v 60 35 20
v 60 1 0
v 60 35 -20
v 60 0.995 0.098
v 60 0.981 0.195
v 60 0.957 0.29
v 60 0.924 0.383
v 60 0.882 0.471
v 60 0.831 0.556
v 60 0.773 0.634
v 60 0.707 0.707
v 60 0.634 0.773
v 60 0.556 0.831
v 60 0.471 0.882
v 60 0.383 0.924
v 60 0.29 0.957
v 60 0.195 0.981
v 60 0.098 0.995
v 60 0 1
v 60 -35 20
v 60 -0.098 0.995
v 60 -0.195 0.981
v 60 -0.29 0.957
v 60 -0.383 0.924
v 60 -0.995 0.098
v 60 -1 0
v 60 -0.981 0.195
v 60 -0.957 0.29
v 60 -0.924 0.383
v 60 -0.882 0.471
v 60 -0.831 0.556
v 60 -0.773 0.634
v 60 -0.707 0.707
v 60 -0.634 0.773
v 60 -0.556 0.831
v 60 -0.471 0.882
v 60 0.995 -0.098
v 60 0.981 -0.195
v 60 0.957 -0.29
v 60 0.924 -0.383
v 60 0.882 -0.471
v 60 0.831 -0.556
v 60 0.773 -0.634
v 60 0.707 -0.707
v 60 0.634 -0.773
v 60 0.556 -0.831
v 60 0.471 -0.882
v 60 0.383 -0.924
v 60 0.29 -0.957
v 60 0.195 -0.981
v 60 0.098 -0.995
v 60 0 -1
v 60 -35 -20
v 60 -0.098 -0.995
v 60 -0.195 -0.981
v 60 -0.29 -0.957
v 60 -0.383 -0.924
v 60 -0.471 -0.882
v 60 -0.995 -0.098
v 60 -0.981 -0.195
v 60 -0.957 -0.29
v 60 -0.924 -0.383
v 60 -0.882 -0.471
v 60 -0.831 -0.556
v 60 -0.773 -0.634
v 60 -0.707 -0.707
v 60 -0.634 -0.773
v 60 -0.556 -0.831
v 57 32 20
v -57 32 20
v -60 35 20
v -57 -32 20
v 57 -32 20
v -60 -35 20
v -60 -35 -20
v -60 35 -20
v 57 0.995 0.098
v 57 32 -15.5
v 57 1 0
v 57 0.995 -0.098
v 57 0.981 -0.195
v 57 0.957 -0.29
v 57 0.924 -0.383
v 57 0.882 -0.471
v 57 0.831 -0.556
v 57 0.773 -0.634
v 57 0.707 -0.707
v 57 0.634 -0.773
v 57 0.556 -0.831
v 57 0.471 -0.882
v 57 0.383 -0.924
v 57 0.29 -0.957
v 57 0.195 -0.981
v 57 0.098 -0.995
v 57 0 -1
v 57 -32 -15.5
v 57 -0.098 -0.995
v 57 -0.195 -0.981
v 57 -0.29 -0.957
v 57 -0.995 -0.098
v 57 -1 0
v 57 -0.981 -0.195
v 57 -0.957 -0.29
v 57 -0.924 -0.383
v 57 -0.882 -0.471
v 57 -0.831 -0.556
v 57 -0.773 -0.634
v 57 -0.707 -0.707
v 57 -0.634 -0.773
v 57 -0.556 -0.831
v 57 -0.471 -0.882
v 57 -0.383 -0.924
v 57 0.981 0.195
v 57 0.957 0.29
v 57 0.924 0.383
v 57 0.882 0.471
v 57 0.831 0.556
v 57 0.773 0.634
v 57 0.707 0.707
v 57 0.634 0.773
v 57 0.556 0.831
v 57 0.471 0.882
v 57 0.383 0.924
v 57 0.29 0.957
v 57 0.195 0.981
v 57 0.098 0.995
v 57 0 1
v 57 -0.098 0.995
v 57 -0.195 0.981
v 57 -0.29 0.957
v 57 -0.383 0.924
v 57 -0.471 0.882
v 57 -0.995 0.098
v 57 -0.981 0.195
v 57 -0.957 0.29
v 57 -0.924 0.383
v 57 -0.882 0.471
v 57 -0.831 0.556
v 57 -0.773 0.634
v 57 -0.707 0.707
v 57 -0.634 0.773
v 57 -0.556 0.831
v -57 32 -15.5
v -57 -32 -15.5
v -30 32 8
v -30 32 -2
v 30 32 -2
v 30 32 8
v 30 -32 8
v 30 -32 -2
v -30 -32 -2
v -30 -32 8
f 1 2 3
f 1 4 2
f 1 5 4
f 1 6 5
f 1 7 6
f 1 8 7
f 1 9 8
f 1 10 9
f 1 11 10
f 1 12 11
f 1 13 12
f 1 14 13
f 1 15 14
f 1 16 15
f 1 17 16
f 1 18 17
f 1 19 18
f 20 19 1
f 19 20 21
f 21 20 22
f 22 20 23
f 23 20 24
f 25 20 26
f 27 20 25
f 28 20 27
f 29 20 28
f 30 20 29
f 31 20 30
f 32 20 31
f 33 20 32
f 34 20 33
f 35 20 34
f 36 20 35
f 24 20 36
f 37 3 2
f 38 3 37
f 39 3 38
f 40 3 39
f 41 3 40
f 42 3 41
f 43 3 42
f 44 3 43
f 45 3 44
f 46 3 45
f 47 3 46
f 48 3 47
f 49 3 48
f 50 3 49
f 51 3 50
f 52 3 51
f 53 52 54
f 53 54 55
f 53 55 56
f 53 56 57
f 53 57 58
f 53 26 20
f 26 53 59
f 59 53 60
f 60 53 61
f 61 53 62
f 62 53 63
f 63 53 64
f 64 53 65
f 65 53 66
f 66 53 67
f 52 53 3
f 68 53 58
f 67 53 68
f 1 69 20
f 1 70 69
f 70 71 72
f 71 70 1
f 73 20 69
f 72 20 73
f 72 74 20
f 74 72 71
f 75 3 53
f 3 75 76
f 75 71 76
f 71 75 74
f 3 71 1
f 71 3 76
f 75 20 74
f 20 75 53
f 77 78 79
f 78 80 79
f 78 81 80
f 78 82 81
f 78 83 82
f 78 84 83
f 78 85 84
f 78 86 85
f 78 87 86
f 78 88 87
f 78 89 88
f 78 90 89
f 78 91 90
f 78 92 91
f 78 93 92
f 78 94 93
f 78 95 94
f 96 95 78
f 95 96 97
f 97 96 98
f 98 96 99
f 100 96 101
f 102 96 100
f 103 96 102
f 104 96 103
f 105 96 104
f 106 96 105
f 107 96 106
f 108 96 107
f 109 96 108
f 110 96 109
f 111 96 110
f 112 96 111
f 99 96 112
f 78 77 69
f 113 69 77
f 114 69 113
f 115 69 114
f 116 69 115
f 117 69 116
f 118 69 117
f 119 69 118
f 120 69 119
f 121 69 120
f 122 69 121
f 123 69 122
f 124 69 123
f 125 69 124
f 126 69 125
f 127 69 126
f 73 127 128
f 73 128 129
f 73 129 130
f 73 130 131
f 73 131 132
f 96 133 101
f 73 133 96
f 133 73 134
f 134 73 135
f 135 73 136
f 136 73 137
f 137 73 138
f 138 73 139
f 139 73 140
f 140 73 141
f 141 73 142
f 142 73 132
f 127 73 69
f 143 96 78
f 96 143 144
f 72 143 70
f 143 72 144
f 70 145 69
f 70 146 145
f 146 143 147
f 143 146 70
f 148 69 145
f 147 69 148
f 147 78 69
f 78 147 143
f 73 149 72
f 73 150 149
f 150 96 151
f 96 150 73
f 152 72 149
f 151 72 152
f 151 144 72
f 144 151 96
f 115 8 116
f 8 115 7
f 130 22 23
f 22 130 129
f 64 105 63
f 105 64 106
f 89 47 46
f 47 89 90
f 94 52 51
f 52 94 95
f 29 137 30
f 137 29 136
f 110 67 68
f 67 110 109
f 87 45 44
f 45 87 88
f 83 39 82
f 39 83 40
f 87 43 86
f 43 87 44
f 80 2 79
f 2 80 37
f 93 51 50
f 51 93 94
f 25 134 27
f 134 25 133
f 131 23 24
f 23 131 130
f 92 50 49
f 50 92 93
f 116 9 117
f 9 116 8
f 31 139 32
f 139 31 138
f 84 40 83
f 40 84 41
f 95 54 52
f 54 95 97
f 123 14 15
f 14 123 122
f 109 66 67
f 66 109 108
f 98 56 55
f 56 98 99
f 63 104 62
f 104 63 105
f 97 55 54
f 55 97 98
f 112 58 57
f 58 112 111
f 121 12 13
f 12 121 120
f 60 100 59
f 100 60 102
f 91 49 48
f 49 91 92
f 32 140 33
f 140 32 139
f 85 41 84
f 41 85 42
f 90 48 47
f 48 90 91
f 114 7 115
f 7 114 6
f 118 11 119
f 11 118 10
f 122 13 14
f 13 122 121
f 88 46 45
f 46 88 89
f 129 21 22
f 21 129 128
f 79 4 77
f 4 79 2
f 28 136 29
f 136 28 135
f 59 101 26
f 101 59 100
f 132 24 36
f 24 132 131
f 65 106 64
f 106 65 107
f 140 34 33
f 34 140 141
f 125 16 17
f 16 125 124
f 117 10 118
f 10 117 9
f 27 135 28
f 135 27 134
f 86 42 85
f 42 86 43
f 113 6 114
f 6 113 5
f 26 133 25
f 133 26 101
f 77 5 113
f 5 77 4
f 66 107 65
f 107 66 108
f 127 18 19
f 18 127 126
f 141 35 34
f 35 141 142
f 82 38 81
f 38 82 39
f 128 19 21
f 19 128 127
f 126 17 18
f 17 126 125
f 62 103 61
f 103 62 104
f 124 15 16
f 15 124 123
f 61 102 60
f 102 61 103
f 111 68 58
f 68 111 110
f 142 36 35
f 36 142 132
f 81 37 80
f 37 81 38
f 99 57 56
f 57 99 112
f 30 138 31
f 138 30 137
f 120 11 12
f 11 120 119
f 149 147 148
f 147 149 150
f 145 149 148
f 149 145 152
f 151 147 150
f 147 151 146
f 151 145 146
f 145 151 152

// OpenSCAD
// Parameters (mm)
outer_x = 120;               // outer length (X)
outer_y = 70;                // outer width  (Y)
outer_z = 40;                // outer height (Z)
wall_thk = 3;                // wall thickness
floor_thk = 3;               // floor thickness

inner_x = outer_x - 2*wall_thk;   // inner cavity length
inner_y = outer_y - 2*wall_thk;   // inner cavity width
inner_z = outer_z - floor_thk;    // inner cavity height (from floor to top)

platform_len = 60;          // platform length (X) inside tank
platform_h = 10;            // platform height (Z) above floor
platform_top_z = floor_thk + platform_h; // absolute Z of platform top

hole_d = 2;                 // electrode hole diameter
hole_r = hole_d/2;
hole_y = 0;                 // hole centre Y
hole_z = 30;                // hole centre Z
cyl_len = outer_x + 1;      // cylinder length (extends 0.5 mm beyond each wall)

// Global resolution for curved shapes
$fn = 64;

// Outer tank (solid)
module outer_tank() {
    cube([outer_x, outer_y, outer_z], center = true);
}

// Inner cavity (to be removed)
module inner_cavity() {
    translate([0, 0, floor_thk])
        cube([inner_x, inner_y, inner_z], center = true);
}

// Raised platform for gel tray
module platform() {
    translate([0, 0, floor_thk])
        cube([platform_len, inner_y, platform_h], center = true);
}

// Horizontal electrode hole through both X‑end walls
module electrode_hole() {
    rotate([0, 90, 0])                     // orient cylinder along X
        translate([0, hole_y, hole_z])      // place centre at (0,0,30)
            cylinder(h = cyl_len, r = hole_r, center = true);
}

// Assemble tank with holes, then add platform
module tank_assembly() {
    difference() {
        outer_tank();
        inner_cavity();
        electrode_hole();
    }
}

union() {
    tank_assembly();
    platform();
}
